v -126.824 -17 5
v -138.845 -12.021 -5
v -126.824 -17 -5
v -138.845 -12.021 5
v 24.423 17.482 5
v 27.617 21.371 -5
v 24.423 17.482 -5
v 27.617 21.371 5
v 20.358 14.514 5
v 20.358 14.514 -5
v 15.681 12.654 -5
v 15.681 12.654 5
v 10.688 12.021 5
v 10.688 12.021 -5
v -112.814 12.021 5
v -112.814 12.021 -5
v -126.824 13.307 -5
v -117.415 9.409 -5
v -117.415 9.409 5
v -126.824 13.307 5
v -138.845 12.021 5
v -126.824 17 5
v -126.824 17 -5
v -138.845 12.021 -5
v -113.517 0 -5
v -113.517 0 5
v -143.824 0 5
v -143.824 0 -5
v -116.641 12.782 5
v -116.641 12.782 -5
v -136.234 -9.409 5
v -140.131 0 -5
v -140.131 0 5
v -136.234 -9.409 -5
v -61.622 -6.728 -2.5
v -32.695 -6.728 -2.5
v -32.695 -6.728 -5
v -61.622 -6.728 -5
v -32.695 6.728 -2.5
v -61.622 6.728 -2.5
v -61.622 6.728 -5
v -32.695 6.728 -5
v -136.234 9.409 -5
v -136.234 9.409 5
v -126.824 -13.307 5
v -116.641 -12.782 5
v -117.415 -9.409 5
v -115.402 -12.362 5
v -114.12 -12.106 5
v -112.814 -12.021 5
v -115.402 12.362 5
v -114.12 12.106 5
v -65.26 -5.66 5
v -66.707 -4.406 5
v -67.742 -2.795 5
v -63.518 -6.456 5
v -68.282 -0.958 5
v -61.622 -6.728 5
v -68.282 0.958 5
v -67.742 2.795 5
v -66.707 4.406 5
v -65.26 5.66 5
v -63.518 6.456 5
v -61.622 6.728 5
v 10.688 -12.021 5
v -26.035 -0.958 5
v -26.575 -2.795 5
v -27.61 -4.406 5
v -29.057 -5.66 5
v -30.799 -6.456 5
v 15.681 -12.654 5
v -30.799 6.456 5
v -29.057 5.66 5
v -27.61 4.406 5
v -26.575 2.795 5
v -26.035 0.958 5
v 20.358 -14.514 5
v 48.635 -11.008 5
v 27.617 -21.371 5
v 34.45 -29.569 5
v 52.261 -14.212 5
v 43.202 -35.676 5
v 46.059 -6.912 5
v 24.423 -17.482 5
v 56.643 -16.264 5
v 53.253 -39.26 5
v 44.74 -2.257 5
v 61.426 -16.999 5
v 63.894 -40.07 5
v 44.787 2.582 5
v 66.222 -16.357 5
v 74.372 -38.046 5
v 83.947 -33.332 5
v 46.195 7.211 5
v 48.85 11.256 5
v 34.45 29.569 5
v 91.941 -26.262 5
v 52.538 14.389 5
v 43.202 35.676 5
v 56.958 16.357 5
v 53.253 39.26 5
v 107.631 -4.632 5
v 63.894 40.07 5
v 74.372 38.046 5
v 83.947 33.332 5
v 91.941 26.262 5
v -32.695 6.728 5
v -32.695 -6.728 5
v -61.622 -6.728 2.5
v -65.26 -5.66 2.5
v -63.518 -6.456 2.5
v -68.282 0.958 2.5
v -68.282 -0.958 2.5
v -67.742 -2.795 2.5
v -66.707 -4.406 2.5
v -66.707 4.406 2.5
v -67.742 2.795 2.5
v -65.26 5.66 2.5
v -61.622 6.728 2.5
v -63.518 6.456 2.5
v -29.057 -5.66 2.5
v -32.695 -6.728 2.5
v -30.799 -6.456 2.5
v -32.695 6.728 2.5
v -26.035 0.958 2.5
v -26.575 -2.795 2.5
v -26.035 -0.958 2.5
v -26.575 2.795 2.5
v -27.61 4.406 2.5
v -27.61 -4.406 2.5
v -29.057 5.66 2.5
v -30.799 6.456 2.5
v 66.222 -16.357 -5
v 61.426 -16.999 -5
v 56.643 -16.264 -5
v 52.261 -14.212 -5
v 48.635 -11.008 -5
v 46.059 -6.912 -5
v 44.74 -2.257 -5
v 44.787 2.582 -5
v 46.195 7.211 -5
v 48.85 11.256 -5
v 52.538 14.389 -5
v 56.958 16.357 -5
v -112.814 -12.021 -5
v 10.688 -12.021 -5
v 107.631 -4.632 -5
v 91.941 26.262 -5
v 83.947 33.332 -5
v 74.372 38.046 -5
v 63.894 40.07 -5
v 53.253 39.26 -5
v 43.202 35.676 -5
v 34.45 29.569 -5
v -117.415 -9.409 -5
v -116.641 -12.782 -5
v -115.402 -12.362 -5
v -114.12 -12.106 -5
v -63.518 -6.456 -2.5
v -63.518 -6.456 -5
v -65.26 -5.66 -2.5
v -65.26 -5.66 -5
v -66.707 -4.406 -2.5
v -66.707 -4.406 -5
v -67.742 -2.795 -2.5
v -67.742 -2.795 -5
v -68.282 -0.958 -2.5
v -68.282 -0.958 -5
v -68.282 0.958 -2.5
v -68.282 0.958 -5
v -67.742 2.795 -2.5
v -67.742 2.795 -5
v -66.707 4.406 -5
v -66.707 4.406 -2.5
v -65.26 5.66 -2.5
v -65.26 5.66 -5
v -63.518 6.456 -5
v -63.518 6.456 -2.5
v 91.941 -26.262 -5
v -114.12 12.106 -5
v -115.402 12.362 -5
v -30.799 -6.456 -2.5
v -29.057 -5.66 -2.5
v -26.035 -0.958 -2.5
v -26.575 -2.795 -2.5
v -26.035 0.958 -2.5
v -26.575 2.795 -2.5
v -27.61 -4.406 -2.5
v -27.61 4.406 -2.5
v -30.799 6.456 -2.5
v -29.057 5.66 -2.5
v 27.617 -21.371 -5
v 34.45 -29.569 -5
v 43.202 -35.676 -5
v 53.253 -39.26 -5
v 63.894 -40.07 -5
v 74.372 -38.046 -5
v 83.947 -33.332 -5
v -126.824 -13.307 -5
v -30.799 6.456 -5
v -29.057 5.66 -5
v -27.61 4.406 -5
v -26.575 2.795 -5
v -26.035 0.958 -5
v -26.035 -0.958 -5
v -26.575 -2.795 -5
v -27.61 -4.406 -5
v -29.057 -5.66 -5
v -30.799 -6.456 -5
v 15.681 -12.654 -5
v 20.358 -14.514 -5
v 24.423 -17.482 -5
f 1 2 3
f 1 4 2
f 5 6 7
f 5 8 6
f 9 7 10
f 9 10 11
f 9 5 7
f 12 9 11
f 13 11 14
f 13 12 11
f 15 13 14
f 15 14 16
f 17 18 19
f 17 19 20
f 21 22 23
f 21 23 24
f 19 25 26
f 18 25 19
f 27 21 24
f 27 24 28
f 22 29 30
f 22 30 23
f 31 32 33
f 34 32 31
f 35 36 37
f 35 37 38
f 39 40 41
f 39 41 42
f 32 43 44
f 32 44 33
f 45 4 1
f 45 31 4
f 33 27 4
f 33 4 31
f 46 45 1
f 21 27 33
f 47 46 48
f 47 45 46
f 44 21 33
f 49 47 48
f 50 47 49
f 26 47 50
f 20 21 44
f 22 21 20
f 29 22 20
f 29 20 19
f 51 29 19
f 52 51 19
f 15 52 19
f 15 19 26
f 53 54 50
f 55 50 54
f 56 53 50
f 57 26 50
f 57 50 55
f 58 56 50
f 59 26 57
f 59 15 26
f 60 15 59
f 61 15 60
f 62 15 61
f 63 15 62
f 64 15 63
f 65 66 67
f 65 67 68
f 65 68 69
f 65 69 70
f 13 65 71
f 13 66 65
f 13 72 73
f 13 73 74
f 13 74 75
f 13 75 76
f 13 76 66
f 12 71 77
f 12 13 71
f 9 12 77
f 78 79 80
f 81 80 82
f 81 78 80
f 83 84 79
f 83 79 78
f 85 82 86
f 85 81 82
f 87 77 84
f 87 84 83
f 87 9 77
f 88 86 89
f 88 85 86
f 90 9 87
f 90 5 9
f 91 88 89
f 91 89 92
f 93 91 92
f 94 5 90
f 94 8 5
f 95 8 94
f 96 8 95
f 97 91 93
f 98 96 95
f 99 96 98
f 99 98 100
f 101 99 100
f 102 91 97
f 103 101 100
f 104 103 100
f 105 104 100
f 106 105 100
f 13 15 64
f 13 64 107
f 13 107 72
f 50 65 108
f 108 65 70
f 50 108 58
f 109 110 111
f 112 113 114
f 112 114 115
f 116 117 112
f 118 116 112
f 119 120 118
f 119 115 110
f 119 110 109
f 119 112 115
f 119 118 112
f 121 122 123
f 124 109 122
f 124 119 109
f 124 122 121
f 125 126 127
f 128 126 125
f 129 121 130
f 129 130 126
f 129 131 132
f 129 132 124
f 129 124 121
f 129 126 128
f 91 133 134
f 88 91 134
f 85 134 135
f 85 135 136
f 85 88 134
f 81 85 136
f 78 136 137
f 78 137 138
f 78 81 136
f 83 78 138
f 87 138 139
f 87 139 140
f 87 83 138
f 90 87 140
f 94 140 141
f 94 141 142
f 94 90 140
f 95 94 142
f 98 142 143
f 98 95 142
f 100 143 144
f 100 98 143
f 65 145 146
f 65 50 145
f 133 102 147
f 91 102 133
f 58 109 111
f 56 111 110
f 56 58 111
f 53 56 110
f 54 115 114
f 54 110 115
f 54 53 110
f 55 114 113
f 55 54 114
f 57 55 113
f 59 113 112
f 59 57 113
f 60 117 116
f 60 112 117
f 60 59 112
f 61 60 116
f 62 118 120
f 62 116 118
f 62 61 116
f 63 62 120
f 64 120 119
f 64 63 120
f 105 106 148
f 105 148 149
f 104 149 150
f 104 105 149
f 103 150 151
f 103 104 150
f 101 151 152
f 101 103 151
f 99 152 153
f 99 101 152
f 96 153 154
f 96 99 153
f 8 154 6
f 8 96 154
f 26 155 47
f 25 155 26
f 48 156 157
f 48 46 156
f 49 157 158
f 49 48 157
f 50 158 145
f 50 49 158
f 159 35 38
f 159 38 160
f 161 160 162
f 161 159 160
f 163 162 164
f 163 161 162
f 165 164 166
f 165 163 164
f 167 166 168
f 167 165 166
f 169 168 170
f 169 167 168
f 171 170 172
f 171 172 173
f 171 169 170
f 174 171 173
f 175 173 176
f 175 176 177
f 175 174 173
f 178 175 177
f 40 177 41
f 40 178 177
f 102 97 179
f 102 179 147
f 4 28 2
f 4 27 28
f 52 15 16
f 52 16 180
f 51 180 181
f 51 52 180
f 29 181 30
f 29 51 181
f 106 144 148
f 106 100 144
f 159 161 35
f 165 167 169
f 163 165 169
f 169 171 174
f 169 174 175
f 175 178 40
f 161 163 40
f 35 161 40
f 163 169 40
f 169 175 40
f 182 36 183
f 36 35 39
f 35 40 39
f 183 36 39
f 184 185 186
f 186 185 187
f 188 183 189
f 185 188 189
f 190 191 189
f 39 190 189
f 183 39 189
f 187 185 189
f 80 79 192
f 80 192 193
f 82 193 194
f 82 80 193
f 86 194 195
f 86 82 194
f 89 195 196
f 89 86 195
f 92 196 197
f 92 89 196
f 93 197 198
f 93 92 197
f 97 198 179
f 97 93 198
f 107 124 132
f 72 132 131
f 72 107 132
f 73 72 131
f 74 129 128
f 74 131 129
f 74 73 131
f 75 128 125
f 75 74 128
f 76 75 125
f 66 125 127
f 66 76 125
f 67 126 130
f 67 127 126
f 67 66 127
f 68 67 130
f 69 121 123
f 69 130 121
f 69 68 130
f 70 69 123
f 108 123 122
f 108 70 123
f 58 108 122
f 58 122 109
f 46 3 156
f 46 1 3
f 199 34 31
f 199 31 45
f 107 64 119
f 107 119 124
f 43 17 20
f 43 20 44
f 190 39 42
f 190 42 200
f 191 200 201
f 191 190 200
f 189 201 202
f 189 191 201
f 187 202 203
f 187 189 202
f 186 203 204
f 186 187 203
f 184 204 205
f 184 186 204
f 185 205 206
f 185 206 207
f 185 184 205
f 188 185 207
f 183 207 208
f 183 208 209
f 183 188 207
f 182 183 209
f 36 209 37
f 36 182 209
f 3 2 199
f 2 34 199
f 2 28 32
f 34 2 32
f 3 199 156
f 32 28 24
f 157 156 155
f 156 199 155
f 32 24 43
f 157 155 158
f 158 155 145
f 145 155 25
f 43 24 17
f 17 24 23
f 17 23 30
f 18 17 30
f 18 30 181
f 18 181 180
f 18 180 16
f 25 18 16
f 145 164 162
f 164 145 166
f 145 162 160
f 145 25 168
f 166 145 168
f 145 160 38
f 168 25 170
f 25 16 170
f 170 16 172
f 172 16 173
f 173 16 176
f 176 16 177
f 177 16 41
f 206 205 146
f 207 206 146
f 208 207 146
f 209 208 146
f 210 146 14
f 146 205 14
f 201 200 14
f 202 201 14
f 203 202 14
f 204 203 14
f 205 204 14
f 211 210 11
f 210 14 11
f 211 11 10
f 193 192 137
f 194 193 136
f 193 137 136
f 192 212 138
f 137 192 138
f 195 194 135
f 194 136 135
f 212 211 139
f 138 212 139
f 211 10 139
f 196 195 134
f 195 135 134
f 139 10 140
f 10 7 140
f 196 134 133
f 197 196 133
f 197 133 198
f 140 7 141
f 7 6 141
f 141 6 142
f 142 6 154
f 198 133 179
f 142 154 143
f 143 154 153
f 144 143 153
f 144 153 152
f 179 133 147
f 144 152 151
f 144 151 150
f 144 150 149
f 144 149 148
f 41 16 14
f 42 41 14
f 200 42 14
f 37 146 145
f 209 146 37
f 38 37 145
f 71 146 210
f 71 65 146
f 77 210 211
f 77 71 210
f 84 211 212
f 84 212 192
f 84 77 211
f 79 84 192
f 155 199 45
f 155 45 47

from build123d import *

# Parameters (mm, degrees)
BOSS_EXTRUDE1_DEPTH     = 5
BOSS_EXTRUDE2_DEPTH     = 2.5
CUT_EXTRUDE1_DEPTH      = 150.653904127
CUT_EXTRUDE1_DEPTH_BACK = 150.653904127


with BuildPart() as part:
    # Sketch1 → Boss-Extrude1 (new, symmetric)
    with BuildSketch(Plane.XY):
        with BuildLine():
            Line((56.958357345, 16.35690948), (91.94062397, 26.262392372))
            ThreePointArc((91.94062397, 26.262392372), (58.546836742, 40.020208922), (27.617225647, 21.371302811))
            ThreePointArc((27.617225647, 21.371302811), (20.358110781, 14.513813118), (10.688318885, 12.02081528))
            Line((10.688318885, 12.02081528), (-112.81430605, 12.02081528))
            ThreePointArc((-112.81430605, 12.02081528), (-114.76520927, 12.212962476), (-116.641140374, 12.782019955))
            Line((-116.641140374, 12.782019955), (-126.824245004, 17))
            Line((-126.824245004, 17), (-138.845060284, 12.02081528))
            Line((-138.845060284, 12.02081528), (-143.824245004, 0))
            Line((-143.824245004, 0), (-138.845060284, -12.02081528))
            Line((-138.845060284, -12.02081528), (-126.824245004, -17))
            Line((-126.824245004, -17), (-116.641140374, -12.782019955))
            ThreePointArc((-116.641140374, -12.782019955), (-114.76520927, -12.212962476), (-112.81430605, -12.02081528))
            Line((-112.81430605, -12.02081528), (10.688318885, -12.02081528))
            ThreePointArc((10.688318885, -12.02081528), (20.358110781, -14.513813118), (27.617225647, -21.371302811))
            ThreePointArc((27.617225647, -21.371302811), (58.546836742, -40.020208922), (91.94062397, -26.262392372))
            Line((91.94062397, -26.262392372), (107.630769277, -4.631577729))
            Line((107.630769277, -4.631577729), (66.221512803, -16.35690948))
            ThreePointArc((66.221512803, -16.35690948), (45.233025594, -4.631577729), (56.958357345, 16.35690948))
        make_face()
        with BuildLine():
            ThreePointArc((-61.622122108, -6.728166576), (-68.350288684, 0), (-61.622122108, 6.728166576))
            Line((-61.622122108, 6.728166576), (-32.694798011, 6.728166576))
            ThreePointArc((-32.694798011, 6.728166576), (-25.966631435, 0), (-32.694798011, -6.728166576))
            Line((-32.694798011, -6.728166576), (-61.622122108, -6.728166576))
        make_face(mode=Mode.SUBTRACT)
    extrude(amount=BOSS_EXTRUDE1_DEPTH, both=True)

    # Sketch1<3> → Boss-Extrude2 (add, symmetric)
    with BuildSketch(Plane.XY):
        with BuildLine():
            Line((-32.694798011, 6.728166576), (-61.622122108, 6.728166576))
            ThreePointArc((-61.622122108, 6.728166576), (-68.350288684, 0), (-61.622122108, -6.728166576))
            Line((-61.622122108, -6.728166576), (-32.694798011, -6.728166576))
            ThreePointArc((-32.694798011, -6.728166576), (-25.966631435, 0), (-32.694798011, 6.728166576))
        make_face()
    extrude(amount=BOSS_EXTRUDE2_DEPTH, both=True)

    # Sketch2 → Cut-Extrude1 (cut, two sides: drawn at the far end of the back side and taken through both)
    with BuildSketch(Plane.XY.offset(5).offset(-CUT_EXTRUDE1_DEPTH_BACK)):
        Polygon((-126.824245004, 13.306981608), (-136.233701936, 9.409456932), (-140.131226612, 0), (-136.233701936, -9.409456932), (-126.824245004, -13.306981608), (-117.414788072, -9.409456932), (-113.517263396, 0), (-117.414788072, 9.409456932), align=None)
    extrude(amount=CUT_EXTRUDE1_DEPTH + CUT_EXTRUDE1_DEPTH_BACK, mode=Mode.SUBTRACT)


solid = part.part
